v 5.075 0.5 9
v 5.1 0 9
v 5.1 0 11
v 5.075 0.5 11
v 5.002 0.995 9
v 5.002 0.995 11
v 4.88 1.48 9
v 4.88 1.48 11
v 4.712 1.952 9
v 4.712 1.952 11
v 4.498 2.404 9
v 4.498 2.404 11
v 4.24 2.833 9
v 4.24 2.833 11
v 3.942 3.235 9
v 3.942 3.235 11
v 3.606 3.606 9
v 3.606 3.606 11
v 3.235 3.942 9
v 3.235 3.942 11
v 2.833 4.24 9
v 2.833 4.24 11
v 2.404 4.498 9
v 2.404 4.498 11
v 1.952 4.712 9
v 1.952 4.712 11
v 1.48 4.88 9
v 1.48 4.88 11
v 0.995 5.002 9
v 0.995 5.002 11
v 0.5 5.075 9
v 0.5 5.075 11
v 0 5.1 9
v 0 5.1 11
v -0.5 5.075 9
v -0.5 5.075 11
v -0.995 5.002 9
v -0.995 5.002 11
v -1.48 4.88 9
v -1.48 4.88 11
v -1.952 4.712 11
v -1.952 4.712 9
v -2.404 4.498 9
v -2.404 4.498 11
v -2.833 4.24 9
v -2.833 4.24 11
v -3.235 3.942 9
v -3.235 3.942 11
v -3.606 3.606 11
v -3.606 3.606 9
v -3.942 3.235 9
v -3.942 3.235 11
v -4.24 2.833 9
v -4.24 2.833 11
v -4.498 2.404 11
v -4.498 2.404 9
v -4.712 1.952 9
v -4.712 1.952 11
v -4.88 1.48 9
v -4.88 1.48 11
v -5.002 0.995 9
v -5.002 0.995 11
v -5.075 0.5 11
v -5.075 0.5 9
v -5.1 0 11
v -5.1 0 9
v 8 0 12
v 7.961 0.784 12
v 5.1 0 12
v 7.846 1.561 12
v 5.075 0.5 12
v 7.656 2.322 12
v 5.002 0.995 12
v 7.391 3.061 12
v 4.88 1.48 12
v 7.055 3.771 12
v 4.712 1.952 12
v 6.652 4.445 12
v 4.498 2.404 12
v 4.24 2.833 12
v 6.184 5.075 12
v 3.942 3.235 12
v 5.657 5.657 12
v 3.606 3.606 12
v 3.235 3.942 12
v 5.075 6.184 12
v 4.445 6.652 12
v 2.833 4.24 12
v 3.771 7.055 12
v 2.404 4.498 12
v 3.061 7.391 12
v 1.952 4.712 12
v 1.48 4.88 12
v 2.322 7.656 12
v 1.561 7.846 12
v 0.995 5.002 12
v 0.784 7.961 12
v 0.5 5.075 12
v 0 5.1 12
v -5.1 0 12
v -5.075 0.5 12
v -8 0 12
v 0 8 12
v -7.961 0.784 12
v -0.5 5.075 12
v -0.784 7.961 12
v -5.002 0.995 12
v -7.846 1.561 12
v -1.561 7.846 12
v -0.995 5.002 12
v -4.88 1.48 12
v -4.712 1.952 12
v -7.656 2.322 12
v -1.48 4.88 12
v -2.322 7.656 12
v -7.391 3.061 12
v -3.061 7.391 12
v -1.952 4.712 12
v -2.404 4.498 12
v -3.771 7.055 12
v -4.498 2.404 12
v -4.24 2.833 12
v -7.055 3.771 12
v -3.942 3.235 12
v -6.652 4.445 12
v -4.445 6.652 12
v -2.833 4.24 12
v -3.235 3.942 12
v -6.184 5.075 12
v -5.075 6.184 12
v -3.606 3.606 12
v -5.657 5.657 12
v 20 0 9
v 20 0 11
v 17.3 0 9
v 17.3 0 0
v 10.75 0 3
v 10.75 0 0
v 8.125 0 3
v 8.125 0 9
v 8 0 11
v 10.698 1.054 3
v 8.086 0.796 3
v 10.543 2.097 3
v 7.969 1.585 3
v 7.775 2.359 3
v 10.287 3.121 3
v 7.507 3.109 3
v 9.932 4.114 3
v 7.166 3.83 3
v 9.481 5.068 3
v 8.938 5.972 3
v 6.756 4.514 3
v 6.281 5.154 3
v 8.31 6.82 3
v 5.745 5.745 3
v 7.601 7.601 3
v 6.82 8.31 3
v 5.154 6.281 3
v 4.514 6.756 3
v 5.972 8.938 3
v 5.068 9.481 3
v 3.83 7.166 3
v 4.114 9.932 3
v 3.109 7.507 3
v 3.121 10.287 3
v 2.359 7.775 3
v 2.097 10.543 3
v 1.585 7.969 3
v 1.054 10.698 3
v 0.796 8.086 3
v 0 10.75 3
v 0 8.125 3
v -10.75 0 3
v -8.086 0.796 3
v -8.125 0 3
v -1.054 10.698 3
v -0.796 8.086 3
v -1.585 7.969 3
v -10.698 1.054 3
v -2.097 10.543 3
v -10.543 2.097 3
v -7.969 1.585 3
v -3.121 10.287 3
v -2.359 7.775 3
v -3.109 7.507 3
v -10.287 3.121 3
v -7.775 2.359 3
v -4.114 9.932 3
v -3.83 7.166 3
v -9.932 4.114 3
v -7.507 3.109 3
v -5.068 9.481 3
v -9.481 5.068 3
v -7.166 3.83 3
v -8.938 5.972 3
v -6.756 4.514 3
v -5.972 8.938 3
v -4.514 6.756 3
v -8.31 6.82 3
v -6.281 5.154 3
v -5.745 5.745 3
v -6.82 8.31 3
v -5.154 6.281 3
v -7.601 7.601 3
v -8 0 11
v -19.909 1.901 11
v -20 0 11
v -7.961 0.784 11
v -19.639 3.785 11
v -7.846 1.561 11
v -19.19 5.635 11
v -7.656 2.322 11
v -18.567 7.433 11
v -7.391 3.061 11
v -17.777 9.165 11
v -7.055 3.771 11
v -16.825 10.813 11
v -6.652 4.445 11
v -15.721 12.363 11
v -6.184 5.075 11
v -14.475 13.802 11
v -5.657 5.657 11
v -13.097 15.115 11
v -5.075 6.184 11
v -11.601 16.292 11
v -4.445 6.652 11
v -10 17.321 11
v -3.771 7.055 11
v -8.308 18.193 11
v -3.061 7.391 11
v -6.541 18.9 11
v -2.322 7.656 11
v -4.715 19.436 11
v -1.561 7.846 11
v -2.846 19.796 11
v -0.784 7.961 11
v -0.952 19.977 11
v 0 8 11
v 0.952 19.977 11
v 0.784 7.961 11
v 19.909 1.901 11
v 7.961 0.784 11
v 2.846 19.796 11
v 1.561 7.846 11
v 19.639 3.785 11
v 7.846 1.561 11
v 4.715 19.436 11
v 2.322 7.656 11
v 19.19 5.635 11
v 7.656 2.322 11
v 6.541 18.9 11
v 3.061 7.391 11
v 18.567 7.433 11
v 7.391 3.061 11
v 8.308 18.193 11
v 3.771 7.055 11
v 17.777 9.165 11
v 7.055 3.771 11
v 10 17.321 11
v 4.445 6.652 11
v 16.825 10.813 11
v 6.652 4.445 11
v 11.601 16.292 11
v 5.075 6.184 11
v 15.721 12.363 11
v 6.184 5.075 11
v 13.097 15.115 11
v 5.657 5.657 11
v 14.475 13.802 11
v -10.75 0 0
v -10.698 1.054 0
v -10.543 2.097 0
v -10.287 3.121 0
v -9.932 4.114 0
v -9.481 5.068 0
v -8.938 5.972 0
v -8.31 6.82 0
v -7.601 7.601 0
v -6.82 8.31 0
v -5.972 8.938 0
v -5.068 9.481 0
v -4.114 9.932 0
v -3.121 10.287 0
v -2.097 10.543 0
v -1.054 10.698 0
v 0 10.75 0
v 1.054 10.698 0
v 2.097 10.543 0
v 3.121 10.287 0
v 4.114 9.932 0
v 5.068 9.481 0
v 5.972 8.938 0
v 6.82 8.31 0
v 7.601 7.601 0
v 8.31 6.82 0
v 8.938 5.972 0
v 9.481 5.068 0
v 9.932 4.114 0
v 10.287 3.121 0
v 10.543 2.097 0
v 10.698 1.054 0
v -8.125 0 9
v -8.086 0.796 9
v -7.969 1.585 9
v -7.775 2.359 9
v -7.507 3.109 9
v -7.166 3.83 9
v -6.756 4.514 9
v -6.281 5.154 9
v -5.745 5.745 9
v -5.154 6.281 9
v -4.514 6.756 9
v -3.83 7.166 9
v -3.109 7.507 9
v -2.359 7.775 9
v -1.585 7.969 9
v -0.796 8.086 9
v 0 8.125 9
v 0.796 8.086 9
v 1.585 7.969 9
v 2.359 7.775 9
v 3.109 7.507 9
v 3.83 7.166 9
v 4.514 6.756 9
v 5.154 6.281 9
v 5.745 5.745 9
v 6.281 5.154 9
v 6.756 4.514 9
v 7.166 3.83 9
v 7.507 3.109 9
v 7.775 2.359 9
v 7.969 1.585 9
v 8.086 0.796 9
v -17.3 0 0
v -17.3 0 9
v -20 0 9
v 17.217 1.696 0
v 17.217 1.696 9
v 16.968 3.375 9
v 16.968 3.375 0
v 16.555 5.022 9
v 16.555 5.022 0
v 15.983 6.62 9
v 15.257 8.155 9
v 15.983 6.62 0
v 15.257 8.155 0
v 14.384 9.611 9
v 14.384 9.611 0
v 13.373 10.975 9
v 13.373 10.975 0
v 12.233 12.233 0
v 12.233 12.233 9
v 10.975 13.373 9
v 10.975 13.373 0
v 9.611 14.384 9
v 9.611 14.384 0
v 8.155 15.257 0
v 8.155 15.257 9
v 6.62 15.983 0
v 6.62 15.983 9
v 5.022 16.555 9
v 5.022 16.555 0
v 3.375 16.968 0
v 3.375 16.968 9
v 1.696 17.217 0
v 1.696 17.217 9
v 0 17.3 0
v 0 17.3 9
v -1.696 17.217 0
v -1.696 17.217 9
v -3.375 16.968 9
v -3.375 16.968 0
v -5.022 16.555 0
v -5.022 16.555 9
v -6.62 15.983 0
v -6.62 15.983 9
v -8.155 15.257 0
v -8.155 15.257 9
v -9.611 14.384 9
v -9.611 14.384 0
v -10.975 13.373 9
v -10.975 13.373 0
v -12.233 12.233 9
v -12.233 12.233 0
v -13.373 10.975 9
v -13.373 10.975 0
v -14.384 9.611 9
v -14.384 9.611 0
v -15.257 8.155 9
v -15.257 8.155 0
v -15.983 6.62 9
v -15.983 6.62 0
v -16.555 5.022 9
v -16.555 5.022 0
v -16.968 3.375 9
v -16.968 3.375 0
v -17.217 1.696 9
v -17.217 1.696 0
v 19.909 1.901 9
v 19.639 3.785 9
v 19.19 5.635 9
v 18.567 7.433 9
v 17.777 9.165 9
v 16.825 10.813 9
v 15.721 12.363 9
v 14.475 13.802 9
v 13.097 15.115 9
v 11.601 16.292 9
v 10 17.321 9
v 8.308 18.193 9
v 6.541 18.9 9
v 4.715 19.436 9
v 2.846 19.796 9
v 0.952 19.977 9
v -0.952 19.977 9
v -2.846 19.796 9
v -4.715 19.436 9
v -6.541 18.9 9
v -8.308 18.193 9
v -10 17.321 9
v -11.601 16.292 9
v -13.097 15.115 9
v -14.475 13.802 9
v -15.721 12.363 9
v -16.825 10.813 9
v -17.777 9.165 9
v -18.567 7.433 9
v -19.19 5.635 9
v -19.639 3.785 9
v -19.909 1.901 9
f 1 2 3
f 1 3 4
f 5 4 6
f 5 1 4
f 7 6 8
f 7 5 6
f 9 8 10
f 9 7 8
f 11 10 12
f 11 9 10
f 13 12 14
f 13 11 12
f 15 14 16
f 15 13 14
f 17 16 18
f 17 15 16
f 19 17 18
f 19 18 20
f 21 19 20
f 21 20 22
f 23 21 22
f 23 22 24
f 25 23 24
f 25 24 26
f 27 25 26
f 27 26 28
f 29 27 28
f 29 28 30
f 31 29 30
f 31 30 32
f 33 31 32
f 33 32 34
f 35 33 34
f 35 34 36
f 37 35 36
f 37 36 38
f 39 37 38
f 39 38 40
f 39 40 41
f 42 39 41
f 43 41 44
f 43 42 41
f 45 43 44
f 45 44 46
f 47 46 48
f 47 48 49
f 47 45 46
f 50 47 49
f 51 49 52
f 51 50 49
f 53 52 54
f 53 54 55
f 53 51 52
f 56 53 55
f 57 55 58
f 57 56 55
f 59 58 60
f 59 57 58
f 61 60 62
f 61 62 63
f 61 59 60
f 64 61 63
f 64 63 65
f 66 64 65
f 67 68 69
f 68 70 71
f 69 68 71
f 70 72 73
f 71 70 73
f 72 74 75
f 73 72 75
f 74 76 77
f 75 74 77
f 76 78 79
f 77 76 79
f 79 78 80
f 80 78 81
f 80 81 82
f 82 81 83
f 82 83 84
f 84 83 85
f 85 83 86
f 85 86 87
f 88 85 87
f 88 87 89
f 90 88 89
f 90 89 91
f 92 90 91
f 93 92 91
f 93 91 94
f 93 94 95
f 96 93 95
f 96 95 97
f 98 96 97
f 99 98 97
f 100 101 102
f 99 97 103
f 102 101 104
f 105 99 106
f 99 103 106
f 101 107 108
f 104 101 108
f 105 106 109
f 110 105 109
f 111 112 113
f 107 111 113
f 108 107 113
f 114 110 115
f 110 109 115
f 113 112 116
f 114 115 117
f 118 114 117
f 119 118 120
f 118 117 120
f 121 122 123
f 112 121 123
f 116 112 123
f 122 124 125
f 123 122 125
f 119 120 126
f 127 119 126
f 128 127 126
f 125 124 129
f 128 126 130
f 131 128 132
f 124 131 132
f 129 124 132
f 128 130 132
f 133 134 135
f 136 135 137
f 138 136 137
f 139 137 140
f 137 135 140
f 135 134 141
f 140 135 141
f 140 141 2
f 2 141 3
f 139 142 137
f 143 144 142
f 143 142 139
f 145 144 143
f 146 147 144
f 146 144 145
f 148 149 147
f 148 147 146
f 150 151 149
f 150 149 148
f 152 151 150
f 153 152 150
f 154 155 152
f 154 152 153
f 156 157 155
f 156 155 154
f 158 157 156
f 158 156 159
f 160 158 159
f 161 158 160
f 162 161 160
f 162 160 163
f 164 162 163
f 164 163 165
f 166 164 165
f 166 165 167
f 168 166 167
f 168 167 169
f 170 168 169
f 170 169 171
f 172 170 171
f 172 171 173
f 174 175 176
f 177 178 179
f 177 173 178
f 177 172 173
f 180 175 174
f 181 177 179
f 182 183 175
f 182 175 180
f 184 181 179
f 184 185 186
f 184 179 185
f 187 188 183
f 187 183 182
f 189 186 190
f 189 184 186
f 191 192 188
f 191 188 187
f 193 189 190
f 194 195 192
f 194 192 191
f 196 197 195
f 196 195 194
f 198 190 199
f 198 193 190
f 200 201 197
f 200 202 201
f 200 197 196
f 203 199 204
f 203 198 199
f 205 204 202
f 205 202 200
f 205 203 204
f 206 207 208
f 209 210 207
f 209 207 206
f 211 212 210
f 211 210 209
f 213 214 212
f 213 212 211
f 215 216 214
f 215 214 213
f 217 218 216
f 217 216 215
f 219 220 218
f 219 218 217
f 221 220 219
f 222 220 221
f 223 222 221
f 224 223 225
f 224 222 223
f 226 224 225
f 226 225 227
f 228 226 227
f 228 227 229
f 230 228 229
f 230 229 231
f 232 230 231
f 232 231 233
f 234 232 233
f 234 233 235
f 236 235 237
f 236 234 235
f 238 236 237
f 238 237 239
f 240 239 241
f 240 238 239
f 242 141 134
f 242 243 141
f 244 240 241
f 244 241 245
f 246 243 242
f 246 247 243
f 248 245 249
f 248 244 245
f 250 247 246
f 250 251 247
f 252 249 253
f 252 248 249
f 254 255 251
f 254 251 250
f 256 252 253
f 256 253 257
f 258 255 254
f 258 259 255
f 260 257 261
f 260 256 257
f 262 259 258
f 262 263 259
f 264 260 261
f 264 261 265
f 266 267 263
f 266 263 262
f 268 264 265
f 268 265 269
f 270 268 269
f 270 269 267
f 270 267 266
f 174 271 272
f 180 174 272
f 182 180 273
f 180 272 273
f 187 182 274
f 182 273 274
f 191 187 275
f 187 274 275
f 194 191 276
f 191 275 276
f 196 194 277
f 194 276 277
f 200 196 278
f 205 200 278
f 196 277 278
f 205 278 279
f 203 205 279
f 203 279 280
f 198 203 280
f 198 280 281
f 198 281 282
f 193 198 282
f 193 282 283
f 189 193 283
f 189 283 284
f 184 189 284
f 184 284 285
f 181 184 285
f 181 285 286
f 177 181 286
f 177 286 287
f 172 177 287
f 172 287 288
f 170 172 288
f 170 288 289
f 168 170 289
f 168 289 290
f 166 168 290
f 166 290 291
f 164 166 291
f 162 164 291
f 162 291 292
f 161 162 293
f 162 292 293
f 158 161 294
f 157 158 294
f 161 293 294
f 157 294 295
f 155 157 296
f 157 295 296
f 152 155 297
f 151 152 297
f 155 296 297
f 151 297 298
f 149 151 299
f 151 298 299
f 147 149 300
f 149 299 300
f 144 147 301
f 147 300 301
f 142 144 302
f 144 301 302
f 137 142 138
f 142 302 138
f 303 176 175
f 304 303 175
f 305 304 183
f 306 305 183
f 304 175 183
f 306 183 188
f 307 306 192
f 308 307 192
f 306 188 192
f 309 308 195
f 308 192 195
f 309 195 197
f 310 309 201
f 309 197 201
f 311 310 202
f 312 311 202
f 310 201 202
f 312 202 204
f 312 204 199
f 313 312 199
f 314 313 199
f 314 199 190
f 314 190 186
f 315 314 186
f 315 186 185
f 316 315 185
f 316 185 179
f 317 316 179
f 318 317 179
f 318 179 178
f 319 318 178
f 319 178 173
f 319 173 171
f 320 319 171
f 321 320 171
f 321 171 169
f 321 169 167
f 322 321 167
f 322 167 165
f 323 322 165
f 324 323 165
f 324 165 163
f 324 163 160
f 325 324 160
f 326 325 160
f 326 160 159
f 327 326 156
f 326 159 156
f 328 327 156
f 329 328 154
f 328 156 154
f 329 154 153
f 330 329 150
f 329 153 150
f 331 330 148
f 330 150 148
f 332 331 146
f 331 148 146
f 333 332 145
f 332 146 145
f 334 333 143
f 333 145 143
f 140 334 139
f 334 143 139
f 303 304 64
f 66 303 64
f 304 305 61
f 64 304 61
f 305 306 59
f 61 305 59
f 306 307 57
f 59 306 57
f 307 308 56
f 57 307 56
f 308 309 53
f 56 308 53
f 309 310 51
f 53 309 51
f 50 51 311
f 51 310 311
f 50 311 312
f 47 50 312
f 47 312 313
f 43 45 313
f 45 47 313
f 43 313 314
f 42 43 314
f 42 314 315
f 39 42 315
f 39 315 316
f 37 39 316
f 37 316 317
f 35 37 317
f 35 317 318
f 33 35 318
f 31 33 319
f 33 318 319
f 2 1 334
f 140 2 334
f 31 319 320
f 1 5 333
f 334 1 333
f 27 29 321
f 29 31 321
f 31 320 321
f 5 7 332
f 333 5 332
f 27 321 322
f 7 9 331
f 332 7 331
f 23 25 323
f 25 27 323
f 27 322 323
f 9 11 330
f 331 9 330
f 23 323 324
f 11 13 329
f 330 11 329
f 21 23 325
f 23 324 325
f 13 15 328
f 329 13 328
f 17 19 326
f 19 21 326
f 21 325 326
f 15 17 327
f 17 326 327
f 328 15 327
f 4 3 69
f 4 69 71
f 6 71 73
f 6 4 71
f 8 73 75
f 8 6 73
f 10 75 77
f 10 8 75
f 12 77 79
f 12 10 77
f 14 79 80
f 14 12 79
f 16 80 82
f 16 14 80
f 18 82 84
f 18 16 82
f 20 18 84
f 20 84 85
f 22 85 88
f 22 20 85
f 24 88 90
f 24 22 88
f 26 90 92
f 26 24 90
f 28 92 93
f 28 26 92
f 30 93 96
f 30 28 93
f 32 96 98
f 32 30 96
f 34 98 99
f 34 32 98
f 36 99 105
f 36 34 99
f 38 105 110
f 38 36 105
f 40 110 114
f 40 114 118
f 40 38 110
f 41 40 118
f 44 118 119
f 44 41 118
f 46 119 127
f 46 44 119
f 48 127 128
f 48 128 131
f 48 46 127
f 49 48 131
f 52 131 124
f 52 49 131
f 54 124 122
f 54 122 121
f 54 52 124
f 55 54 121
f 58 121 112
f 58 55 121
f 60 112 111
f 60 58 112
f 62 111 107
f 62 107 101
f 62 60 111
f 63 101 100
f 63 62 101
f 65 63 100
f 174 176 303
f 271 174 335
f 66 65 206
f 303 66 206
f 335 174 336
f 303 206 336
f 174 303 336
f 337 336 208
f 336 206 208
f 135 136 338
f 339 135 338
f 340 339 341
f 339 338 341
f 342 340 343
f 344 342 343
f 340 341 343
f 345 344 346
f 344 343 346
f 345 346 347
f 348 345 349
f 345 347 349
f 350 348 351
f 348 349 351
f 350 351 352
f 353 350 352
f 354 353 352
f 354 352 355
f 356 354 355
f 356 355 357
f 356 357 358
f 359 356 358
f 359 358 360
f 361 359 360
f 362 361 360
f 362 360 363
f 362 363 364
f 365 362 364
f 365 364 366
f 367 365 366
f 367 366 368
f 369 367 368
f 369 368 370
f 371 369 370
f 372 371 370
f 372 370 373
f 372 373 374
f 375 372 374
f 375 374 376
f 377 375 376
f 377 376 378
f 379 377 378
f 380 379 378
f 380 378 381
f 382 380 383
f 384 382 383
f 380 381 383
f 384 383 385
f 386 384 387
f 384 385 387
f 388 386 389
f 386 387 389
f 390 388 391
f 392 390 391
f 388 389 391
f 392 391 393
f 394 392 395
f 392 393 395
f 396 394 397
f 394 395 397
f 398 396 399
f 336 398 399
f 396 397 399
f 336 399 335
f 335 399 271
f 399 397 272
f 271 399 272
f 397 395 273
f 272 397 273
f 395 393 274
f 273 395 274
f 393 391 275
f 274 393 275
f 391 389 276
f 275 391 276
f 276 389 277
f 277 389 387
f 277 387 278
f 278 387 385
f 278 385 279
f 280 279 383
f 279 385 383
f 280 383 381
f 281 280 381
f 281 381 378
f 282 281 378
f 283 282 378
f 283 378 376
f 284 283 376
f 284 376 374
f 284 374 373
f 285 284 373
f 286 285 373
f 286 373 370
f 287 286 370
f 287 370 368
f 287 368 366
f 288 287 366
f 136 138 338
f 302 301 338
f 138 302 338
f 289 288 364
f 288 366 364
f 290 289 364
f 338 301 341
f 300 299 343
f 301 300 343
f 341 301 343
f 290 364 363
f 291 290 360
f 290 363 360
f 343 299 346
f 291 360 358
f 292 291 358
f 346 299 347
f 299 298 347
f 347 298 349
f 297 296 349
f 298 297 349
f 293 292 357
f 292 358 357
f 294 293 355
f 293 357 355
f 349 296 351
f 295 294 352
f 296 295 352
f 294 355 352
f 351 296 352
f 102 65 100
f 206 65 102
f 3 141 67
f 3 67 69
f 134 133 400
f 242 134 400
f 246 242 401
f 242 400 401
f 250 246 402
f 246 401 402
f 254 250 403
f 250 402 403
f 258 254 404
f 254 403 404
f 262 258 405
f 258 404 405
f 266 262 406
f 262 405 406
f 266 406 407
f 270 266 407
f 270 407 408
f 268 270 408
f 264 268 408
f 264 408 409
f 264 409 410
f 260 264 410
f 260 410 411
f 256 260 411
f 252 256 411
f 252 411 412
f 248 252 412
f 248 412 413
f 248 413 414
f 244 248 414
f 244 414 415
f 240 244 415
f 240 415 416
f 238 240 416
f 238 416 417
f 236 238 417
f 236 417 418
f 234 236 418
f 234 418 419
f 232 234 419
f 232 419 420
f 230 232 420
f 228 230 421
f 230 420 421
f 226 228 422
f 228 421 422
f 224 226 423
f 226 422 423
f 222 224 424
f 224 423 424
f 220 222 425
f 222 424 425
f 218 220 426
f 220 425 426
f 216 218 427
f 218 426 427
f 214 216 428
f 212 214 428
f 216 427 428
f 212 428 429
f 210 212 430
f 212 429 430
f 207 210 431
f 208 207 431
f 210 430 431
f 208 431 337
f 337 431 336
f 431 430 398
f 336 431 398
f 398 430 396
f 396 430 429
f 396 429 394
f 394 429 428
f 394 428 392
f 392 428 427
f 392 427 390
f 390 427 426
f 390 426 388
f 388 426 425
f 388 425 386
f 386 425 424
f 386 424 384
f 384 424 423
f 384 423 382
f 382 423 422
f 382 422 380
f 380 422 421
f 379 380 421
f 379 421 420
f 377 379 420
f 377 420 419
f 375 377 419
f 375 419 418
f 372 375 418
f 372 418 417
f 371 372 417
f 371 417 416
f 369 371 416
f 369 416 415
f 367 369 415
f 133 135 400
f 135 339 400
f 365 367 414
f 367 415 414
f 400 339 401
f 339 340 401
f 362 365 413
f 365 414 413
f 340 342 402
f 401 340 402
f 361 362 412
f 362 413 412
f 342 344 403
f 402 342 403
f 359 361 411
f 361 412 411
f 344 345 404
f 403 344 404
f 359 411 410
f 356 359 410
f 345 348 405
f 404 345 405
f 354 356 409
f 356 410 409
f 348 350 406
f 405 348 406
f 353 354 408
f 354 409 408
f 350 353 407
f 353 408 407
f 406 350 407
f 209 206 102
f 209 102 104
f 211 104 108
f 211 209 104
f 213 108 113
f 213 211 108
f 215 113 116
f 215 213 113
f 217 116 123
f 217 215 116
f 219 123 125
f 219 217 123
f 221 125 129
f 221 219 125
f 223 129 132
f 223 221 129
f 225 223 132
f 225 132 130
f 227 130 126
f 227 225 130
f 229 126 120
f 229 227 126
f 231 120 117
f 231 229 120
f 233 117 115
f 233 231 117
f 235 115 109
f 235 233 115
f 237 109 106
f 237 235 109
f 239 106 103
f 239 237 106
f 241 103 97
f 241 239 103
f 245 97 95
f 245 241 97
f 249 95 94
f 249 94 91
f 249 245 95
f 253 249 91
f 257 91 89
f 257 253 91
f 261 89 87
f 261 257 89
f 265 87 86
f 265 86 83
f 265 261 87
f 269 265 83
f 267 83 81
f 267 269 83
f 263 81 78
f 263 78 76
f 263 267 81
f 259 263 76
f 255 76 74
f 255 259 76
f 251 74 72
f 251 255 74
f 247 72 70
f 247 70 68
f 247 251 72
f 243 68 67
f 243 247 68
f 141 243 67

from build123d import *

# Parameters (mm, degrees)
SKETCH1_R               = 17.3
BOSS_EXTRUDE1_DEPTH     = 9
SKETCH2_R               = 5.1
CUT_EXTRUDE1_DEPTH      = 10
SKETCH3_R               = 8.125
CUT_EXTRUDE2_DEPTH      = 9
SKETCH4_R               = 20
SKETCH4_R_2             = 5.1
BOSS_EXTRUDE2_DEPTH     = 2
CUT_EXTRUDE3_DEPTH      = 31.347981811
CUT_EXTRUDE3_DEPTH_BACK = 31.347981811
SKETCH5_W               = 52.021349681
SKETCH5_H               = 22.661429066
BOSS_EXTRUDE3_DEPTH     = 1
SKETCH8_R               = 10.75
CUT_EXTRUDE4_DEPTH      = 3


with BuildPart() as part:
    # Sketch1 → Boss-Extrude1 (new body)
    with BuildSketch(Plane.XY):
        Circle(SKETCH1_R)
    extrude(amount=BOSS_EXTRUDE1_DEPTH)

    # Sketch2 → Cut-Extrude1 (cut)
    with BuildSketch(Plane.XY.offset(9)):
        Circle(SKETCH2_R)
    extrude(amount=-CUT_EXTRUDE1_DEPTH, mode=Mode.SUBTRACT)

    # Sketch3 → Cut-Extrude2 (cut)
    with BuildSketch(Plane(origin=(0, 0, 0), x_dir=(-1, 0, 0), z_dir=(0, 0, -1))):
        Circle(SKETCH3_R)
    extrude(amount=-CUT_EXTRUDE2_DEPTH, mode=Mode.SUBTRACT)

    # Sketch4 → Boss-Extrude2 (add)
    with BuildSketch(Plane.XY.offset(9)):
        Circle(SKETCH4_R)
        Circle(SKETCH4_R_2, mode=Mode.SUBTRACT)
    extrude(amount=BOSS_EXTRUDE2_DEPTH)

    # Sketch5 → Cut-Extrude3 (cut, two sides: drawn at the far end of the back side and taken through both)
    with BuildSketch(Plane(origin=(0, 0, 0), x_dir=(-1, 0, 0), z_dir=(0, 0, -1)).offset(-CUT_EXTRUDE3_DEPTH_BACK)):
        with Locations((0.459170792, -11.330714533)):
            Rectangle(SKETCH5_W, SKETCH5_H)
    extrude(amount=CUT_EXTRUDE3_DEPTH + CUT_EXTRUDE3_DEPTH_BACK, mode=Mode.SUBTRACT)

    # Sketch7 → Boss-Extrude3 (add)
    with BuildSketch(Plane.XY.offset(11)):
        with BuildLine():
            Line((-5.1, 0), (-8, 0))
            ThreePointArc((-8, 0), (0, 8), (8, 0))
            Line((8, 0), (5.1, 0))
            ThreePointArc((5.1, 0), (0, 5.1), (-5.1, 0))
        make_face()
    extrude(amount=BOSS_EXTRUDE3_DEPTH)

    # Sketch8 → Cut-Extrude4 (cut)
    with BuildSketch(Plane(origin=(0, 0, 0), x_dir=(-1, 0, 0), z_dir=(0, 0, -1))):
        Circle(SKETCH8_R)
    extrude(amount=-CUT_EXTRUDE4_DEPTH, mode=Mode.SUBTRACT)


solid = part.part
